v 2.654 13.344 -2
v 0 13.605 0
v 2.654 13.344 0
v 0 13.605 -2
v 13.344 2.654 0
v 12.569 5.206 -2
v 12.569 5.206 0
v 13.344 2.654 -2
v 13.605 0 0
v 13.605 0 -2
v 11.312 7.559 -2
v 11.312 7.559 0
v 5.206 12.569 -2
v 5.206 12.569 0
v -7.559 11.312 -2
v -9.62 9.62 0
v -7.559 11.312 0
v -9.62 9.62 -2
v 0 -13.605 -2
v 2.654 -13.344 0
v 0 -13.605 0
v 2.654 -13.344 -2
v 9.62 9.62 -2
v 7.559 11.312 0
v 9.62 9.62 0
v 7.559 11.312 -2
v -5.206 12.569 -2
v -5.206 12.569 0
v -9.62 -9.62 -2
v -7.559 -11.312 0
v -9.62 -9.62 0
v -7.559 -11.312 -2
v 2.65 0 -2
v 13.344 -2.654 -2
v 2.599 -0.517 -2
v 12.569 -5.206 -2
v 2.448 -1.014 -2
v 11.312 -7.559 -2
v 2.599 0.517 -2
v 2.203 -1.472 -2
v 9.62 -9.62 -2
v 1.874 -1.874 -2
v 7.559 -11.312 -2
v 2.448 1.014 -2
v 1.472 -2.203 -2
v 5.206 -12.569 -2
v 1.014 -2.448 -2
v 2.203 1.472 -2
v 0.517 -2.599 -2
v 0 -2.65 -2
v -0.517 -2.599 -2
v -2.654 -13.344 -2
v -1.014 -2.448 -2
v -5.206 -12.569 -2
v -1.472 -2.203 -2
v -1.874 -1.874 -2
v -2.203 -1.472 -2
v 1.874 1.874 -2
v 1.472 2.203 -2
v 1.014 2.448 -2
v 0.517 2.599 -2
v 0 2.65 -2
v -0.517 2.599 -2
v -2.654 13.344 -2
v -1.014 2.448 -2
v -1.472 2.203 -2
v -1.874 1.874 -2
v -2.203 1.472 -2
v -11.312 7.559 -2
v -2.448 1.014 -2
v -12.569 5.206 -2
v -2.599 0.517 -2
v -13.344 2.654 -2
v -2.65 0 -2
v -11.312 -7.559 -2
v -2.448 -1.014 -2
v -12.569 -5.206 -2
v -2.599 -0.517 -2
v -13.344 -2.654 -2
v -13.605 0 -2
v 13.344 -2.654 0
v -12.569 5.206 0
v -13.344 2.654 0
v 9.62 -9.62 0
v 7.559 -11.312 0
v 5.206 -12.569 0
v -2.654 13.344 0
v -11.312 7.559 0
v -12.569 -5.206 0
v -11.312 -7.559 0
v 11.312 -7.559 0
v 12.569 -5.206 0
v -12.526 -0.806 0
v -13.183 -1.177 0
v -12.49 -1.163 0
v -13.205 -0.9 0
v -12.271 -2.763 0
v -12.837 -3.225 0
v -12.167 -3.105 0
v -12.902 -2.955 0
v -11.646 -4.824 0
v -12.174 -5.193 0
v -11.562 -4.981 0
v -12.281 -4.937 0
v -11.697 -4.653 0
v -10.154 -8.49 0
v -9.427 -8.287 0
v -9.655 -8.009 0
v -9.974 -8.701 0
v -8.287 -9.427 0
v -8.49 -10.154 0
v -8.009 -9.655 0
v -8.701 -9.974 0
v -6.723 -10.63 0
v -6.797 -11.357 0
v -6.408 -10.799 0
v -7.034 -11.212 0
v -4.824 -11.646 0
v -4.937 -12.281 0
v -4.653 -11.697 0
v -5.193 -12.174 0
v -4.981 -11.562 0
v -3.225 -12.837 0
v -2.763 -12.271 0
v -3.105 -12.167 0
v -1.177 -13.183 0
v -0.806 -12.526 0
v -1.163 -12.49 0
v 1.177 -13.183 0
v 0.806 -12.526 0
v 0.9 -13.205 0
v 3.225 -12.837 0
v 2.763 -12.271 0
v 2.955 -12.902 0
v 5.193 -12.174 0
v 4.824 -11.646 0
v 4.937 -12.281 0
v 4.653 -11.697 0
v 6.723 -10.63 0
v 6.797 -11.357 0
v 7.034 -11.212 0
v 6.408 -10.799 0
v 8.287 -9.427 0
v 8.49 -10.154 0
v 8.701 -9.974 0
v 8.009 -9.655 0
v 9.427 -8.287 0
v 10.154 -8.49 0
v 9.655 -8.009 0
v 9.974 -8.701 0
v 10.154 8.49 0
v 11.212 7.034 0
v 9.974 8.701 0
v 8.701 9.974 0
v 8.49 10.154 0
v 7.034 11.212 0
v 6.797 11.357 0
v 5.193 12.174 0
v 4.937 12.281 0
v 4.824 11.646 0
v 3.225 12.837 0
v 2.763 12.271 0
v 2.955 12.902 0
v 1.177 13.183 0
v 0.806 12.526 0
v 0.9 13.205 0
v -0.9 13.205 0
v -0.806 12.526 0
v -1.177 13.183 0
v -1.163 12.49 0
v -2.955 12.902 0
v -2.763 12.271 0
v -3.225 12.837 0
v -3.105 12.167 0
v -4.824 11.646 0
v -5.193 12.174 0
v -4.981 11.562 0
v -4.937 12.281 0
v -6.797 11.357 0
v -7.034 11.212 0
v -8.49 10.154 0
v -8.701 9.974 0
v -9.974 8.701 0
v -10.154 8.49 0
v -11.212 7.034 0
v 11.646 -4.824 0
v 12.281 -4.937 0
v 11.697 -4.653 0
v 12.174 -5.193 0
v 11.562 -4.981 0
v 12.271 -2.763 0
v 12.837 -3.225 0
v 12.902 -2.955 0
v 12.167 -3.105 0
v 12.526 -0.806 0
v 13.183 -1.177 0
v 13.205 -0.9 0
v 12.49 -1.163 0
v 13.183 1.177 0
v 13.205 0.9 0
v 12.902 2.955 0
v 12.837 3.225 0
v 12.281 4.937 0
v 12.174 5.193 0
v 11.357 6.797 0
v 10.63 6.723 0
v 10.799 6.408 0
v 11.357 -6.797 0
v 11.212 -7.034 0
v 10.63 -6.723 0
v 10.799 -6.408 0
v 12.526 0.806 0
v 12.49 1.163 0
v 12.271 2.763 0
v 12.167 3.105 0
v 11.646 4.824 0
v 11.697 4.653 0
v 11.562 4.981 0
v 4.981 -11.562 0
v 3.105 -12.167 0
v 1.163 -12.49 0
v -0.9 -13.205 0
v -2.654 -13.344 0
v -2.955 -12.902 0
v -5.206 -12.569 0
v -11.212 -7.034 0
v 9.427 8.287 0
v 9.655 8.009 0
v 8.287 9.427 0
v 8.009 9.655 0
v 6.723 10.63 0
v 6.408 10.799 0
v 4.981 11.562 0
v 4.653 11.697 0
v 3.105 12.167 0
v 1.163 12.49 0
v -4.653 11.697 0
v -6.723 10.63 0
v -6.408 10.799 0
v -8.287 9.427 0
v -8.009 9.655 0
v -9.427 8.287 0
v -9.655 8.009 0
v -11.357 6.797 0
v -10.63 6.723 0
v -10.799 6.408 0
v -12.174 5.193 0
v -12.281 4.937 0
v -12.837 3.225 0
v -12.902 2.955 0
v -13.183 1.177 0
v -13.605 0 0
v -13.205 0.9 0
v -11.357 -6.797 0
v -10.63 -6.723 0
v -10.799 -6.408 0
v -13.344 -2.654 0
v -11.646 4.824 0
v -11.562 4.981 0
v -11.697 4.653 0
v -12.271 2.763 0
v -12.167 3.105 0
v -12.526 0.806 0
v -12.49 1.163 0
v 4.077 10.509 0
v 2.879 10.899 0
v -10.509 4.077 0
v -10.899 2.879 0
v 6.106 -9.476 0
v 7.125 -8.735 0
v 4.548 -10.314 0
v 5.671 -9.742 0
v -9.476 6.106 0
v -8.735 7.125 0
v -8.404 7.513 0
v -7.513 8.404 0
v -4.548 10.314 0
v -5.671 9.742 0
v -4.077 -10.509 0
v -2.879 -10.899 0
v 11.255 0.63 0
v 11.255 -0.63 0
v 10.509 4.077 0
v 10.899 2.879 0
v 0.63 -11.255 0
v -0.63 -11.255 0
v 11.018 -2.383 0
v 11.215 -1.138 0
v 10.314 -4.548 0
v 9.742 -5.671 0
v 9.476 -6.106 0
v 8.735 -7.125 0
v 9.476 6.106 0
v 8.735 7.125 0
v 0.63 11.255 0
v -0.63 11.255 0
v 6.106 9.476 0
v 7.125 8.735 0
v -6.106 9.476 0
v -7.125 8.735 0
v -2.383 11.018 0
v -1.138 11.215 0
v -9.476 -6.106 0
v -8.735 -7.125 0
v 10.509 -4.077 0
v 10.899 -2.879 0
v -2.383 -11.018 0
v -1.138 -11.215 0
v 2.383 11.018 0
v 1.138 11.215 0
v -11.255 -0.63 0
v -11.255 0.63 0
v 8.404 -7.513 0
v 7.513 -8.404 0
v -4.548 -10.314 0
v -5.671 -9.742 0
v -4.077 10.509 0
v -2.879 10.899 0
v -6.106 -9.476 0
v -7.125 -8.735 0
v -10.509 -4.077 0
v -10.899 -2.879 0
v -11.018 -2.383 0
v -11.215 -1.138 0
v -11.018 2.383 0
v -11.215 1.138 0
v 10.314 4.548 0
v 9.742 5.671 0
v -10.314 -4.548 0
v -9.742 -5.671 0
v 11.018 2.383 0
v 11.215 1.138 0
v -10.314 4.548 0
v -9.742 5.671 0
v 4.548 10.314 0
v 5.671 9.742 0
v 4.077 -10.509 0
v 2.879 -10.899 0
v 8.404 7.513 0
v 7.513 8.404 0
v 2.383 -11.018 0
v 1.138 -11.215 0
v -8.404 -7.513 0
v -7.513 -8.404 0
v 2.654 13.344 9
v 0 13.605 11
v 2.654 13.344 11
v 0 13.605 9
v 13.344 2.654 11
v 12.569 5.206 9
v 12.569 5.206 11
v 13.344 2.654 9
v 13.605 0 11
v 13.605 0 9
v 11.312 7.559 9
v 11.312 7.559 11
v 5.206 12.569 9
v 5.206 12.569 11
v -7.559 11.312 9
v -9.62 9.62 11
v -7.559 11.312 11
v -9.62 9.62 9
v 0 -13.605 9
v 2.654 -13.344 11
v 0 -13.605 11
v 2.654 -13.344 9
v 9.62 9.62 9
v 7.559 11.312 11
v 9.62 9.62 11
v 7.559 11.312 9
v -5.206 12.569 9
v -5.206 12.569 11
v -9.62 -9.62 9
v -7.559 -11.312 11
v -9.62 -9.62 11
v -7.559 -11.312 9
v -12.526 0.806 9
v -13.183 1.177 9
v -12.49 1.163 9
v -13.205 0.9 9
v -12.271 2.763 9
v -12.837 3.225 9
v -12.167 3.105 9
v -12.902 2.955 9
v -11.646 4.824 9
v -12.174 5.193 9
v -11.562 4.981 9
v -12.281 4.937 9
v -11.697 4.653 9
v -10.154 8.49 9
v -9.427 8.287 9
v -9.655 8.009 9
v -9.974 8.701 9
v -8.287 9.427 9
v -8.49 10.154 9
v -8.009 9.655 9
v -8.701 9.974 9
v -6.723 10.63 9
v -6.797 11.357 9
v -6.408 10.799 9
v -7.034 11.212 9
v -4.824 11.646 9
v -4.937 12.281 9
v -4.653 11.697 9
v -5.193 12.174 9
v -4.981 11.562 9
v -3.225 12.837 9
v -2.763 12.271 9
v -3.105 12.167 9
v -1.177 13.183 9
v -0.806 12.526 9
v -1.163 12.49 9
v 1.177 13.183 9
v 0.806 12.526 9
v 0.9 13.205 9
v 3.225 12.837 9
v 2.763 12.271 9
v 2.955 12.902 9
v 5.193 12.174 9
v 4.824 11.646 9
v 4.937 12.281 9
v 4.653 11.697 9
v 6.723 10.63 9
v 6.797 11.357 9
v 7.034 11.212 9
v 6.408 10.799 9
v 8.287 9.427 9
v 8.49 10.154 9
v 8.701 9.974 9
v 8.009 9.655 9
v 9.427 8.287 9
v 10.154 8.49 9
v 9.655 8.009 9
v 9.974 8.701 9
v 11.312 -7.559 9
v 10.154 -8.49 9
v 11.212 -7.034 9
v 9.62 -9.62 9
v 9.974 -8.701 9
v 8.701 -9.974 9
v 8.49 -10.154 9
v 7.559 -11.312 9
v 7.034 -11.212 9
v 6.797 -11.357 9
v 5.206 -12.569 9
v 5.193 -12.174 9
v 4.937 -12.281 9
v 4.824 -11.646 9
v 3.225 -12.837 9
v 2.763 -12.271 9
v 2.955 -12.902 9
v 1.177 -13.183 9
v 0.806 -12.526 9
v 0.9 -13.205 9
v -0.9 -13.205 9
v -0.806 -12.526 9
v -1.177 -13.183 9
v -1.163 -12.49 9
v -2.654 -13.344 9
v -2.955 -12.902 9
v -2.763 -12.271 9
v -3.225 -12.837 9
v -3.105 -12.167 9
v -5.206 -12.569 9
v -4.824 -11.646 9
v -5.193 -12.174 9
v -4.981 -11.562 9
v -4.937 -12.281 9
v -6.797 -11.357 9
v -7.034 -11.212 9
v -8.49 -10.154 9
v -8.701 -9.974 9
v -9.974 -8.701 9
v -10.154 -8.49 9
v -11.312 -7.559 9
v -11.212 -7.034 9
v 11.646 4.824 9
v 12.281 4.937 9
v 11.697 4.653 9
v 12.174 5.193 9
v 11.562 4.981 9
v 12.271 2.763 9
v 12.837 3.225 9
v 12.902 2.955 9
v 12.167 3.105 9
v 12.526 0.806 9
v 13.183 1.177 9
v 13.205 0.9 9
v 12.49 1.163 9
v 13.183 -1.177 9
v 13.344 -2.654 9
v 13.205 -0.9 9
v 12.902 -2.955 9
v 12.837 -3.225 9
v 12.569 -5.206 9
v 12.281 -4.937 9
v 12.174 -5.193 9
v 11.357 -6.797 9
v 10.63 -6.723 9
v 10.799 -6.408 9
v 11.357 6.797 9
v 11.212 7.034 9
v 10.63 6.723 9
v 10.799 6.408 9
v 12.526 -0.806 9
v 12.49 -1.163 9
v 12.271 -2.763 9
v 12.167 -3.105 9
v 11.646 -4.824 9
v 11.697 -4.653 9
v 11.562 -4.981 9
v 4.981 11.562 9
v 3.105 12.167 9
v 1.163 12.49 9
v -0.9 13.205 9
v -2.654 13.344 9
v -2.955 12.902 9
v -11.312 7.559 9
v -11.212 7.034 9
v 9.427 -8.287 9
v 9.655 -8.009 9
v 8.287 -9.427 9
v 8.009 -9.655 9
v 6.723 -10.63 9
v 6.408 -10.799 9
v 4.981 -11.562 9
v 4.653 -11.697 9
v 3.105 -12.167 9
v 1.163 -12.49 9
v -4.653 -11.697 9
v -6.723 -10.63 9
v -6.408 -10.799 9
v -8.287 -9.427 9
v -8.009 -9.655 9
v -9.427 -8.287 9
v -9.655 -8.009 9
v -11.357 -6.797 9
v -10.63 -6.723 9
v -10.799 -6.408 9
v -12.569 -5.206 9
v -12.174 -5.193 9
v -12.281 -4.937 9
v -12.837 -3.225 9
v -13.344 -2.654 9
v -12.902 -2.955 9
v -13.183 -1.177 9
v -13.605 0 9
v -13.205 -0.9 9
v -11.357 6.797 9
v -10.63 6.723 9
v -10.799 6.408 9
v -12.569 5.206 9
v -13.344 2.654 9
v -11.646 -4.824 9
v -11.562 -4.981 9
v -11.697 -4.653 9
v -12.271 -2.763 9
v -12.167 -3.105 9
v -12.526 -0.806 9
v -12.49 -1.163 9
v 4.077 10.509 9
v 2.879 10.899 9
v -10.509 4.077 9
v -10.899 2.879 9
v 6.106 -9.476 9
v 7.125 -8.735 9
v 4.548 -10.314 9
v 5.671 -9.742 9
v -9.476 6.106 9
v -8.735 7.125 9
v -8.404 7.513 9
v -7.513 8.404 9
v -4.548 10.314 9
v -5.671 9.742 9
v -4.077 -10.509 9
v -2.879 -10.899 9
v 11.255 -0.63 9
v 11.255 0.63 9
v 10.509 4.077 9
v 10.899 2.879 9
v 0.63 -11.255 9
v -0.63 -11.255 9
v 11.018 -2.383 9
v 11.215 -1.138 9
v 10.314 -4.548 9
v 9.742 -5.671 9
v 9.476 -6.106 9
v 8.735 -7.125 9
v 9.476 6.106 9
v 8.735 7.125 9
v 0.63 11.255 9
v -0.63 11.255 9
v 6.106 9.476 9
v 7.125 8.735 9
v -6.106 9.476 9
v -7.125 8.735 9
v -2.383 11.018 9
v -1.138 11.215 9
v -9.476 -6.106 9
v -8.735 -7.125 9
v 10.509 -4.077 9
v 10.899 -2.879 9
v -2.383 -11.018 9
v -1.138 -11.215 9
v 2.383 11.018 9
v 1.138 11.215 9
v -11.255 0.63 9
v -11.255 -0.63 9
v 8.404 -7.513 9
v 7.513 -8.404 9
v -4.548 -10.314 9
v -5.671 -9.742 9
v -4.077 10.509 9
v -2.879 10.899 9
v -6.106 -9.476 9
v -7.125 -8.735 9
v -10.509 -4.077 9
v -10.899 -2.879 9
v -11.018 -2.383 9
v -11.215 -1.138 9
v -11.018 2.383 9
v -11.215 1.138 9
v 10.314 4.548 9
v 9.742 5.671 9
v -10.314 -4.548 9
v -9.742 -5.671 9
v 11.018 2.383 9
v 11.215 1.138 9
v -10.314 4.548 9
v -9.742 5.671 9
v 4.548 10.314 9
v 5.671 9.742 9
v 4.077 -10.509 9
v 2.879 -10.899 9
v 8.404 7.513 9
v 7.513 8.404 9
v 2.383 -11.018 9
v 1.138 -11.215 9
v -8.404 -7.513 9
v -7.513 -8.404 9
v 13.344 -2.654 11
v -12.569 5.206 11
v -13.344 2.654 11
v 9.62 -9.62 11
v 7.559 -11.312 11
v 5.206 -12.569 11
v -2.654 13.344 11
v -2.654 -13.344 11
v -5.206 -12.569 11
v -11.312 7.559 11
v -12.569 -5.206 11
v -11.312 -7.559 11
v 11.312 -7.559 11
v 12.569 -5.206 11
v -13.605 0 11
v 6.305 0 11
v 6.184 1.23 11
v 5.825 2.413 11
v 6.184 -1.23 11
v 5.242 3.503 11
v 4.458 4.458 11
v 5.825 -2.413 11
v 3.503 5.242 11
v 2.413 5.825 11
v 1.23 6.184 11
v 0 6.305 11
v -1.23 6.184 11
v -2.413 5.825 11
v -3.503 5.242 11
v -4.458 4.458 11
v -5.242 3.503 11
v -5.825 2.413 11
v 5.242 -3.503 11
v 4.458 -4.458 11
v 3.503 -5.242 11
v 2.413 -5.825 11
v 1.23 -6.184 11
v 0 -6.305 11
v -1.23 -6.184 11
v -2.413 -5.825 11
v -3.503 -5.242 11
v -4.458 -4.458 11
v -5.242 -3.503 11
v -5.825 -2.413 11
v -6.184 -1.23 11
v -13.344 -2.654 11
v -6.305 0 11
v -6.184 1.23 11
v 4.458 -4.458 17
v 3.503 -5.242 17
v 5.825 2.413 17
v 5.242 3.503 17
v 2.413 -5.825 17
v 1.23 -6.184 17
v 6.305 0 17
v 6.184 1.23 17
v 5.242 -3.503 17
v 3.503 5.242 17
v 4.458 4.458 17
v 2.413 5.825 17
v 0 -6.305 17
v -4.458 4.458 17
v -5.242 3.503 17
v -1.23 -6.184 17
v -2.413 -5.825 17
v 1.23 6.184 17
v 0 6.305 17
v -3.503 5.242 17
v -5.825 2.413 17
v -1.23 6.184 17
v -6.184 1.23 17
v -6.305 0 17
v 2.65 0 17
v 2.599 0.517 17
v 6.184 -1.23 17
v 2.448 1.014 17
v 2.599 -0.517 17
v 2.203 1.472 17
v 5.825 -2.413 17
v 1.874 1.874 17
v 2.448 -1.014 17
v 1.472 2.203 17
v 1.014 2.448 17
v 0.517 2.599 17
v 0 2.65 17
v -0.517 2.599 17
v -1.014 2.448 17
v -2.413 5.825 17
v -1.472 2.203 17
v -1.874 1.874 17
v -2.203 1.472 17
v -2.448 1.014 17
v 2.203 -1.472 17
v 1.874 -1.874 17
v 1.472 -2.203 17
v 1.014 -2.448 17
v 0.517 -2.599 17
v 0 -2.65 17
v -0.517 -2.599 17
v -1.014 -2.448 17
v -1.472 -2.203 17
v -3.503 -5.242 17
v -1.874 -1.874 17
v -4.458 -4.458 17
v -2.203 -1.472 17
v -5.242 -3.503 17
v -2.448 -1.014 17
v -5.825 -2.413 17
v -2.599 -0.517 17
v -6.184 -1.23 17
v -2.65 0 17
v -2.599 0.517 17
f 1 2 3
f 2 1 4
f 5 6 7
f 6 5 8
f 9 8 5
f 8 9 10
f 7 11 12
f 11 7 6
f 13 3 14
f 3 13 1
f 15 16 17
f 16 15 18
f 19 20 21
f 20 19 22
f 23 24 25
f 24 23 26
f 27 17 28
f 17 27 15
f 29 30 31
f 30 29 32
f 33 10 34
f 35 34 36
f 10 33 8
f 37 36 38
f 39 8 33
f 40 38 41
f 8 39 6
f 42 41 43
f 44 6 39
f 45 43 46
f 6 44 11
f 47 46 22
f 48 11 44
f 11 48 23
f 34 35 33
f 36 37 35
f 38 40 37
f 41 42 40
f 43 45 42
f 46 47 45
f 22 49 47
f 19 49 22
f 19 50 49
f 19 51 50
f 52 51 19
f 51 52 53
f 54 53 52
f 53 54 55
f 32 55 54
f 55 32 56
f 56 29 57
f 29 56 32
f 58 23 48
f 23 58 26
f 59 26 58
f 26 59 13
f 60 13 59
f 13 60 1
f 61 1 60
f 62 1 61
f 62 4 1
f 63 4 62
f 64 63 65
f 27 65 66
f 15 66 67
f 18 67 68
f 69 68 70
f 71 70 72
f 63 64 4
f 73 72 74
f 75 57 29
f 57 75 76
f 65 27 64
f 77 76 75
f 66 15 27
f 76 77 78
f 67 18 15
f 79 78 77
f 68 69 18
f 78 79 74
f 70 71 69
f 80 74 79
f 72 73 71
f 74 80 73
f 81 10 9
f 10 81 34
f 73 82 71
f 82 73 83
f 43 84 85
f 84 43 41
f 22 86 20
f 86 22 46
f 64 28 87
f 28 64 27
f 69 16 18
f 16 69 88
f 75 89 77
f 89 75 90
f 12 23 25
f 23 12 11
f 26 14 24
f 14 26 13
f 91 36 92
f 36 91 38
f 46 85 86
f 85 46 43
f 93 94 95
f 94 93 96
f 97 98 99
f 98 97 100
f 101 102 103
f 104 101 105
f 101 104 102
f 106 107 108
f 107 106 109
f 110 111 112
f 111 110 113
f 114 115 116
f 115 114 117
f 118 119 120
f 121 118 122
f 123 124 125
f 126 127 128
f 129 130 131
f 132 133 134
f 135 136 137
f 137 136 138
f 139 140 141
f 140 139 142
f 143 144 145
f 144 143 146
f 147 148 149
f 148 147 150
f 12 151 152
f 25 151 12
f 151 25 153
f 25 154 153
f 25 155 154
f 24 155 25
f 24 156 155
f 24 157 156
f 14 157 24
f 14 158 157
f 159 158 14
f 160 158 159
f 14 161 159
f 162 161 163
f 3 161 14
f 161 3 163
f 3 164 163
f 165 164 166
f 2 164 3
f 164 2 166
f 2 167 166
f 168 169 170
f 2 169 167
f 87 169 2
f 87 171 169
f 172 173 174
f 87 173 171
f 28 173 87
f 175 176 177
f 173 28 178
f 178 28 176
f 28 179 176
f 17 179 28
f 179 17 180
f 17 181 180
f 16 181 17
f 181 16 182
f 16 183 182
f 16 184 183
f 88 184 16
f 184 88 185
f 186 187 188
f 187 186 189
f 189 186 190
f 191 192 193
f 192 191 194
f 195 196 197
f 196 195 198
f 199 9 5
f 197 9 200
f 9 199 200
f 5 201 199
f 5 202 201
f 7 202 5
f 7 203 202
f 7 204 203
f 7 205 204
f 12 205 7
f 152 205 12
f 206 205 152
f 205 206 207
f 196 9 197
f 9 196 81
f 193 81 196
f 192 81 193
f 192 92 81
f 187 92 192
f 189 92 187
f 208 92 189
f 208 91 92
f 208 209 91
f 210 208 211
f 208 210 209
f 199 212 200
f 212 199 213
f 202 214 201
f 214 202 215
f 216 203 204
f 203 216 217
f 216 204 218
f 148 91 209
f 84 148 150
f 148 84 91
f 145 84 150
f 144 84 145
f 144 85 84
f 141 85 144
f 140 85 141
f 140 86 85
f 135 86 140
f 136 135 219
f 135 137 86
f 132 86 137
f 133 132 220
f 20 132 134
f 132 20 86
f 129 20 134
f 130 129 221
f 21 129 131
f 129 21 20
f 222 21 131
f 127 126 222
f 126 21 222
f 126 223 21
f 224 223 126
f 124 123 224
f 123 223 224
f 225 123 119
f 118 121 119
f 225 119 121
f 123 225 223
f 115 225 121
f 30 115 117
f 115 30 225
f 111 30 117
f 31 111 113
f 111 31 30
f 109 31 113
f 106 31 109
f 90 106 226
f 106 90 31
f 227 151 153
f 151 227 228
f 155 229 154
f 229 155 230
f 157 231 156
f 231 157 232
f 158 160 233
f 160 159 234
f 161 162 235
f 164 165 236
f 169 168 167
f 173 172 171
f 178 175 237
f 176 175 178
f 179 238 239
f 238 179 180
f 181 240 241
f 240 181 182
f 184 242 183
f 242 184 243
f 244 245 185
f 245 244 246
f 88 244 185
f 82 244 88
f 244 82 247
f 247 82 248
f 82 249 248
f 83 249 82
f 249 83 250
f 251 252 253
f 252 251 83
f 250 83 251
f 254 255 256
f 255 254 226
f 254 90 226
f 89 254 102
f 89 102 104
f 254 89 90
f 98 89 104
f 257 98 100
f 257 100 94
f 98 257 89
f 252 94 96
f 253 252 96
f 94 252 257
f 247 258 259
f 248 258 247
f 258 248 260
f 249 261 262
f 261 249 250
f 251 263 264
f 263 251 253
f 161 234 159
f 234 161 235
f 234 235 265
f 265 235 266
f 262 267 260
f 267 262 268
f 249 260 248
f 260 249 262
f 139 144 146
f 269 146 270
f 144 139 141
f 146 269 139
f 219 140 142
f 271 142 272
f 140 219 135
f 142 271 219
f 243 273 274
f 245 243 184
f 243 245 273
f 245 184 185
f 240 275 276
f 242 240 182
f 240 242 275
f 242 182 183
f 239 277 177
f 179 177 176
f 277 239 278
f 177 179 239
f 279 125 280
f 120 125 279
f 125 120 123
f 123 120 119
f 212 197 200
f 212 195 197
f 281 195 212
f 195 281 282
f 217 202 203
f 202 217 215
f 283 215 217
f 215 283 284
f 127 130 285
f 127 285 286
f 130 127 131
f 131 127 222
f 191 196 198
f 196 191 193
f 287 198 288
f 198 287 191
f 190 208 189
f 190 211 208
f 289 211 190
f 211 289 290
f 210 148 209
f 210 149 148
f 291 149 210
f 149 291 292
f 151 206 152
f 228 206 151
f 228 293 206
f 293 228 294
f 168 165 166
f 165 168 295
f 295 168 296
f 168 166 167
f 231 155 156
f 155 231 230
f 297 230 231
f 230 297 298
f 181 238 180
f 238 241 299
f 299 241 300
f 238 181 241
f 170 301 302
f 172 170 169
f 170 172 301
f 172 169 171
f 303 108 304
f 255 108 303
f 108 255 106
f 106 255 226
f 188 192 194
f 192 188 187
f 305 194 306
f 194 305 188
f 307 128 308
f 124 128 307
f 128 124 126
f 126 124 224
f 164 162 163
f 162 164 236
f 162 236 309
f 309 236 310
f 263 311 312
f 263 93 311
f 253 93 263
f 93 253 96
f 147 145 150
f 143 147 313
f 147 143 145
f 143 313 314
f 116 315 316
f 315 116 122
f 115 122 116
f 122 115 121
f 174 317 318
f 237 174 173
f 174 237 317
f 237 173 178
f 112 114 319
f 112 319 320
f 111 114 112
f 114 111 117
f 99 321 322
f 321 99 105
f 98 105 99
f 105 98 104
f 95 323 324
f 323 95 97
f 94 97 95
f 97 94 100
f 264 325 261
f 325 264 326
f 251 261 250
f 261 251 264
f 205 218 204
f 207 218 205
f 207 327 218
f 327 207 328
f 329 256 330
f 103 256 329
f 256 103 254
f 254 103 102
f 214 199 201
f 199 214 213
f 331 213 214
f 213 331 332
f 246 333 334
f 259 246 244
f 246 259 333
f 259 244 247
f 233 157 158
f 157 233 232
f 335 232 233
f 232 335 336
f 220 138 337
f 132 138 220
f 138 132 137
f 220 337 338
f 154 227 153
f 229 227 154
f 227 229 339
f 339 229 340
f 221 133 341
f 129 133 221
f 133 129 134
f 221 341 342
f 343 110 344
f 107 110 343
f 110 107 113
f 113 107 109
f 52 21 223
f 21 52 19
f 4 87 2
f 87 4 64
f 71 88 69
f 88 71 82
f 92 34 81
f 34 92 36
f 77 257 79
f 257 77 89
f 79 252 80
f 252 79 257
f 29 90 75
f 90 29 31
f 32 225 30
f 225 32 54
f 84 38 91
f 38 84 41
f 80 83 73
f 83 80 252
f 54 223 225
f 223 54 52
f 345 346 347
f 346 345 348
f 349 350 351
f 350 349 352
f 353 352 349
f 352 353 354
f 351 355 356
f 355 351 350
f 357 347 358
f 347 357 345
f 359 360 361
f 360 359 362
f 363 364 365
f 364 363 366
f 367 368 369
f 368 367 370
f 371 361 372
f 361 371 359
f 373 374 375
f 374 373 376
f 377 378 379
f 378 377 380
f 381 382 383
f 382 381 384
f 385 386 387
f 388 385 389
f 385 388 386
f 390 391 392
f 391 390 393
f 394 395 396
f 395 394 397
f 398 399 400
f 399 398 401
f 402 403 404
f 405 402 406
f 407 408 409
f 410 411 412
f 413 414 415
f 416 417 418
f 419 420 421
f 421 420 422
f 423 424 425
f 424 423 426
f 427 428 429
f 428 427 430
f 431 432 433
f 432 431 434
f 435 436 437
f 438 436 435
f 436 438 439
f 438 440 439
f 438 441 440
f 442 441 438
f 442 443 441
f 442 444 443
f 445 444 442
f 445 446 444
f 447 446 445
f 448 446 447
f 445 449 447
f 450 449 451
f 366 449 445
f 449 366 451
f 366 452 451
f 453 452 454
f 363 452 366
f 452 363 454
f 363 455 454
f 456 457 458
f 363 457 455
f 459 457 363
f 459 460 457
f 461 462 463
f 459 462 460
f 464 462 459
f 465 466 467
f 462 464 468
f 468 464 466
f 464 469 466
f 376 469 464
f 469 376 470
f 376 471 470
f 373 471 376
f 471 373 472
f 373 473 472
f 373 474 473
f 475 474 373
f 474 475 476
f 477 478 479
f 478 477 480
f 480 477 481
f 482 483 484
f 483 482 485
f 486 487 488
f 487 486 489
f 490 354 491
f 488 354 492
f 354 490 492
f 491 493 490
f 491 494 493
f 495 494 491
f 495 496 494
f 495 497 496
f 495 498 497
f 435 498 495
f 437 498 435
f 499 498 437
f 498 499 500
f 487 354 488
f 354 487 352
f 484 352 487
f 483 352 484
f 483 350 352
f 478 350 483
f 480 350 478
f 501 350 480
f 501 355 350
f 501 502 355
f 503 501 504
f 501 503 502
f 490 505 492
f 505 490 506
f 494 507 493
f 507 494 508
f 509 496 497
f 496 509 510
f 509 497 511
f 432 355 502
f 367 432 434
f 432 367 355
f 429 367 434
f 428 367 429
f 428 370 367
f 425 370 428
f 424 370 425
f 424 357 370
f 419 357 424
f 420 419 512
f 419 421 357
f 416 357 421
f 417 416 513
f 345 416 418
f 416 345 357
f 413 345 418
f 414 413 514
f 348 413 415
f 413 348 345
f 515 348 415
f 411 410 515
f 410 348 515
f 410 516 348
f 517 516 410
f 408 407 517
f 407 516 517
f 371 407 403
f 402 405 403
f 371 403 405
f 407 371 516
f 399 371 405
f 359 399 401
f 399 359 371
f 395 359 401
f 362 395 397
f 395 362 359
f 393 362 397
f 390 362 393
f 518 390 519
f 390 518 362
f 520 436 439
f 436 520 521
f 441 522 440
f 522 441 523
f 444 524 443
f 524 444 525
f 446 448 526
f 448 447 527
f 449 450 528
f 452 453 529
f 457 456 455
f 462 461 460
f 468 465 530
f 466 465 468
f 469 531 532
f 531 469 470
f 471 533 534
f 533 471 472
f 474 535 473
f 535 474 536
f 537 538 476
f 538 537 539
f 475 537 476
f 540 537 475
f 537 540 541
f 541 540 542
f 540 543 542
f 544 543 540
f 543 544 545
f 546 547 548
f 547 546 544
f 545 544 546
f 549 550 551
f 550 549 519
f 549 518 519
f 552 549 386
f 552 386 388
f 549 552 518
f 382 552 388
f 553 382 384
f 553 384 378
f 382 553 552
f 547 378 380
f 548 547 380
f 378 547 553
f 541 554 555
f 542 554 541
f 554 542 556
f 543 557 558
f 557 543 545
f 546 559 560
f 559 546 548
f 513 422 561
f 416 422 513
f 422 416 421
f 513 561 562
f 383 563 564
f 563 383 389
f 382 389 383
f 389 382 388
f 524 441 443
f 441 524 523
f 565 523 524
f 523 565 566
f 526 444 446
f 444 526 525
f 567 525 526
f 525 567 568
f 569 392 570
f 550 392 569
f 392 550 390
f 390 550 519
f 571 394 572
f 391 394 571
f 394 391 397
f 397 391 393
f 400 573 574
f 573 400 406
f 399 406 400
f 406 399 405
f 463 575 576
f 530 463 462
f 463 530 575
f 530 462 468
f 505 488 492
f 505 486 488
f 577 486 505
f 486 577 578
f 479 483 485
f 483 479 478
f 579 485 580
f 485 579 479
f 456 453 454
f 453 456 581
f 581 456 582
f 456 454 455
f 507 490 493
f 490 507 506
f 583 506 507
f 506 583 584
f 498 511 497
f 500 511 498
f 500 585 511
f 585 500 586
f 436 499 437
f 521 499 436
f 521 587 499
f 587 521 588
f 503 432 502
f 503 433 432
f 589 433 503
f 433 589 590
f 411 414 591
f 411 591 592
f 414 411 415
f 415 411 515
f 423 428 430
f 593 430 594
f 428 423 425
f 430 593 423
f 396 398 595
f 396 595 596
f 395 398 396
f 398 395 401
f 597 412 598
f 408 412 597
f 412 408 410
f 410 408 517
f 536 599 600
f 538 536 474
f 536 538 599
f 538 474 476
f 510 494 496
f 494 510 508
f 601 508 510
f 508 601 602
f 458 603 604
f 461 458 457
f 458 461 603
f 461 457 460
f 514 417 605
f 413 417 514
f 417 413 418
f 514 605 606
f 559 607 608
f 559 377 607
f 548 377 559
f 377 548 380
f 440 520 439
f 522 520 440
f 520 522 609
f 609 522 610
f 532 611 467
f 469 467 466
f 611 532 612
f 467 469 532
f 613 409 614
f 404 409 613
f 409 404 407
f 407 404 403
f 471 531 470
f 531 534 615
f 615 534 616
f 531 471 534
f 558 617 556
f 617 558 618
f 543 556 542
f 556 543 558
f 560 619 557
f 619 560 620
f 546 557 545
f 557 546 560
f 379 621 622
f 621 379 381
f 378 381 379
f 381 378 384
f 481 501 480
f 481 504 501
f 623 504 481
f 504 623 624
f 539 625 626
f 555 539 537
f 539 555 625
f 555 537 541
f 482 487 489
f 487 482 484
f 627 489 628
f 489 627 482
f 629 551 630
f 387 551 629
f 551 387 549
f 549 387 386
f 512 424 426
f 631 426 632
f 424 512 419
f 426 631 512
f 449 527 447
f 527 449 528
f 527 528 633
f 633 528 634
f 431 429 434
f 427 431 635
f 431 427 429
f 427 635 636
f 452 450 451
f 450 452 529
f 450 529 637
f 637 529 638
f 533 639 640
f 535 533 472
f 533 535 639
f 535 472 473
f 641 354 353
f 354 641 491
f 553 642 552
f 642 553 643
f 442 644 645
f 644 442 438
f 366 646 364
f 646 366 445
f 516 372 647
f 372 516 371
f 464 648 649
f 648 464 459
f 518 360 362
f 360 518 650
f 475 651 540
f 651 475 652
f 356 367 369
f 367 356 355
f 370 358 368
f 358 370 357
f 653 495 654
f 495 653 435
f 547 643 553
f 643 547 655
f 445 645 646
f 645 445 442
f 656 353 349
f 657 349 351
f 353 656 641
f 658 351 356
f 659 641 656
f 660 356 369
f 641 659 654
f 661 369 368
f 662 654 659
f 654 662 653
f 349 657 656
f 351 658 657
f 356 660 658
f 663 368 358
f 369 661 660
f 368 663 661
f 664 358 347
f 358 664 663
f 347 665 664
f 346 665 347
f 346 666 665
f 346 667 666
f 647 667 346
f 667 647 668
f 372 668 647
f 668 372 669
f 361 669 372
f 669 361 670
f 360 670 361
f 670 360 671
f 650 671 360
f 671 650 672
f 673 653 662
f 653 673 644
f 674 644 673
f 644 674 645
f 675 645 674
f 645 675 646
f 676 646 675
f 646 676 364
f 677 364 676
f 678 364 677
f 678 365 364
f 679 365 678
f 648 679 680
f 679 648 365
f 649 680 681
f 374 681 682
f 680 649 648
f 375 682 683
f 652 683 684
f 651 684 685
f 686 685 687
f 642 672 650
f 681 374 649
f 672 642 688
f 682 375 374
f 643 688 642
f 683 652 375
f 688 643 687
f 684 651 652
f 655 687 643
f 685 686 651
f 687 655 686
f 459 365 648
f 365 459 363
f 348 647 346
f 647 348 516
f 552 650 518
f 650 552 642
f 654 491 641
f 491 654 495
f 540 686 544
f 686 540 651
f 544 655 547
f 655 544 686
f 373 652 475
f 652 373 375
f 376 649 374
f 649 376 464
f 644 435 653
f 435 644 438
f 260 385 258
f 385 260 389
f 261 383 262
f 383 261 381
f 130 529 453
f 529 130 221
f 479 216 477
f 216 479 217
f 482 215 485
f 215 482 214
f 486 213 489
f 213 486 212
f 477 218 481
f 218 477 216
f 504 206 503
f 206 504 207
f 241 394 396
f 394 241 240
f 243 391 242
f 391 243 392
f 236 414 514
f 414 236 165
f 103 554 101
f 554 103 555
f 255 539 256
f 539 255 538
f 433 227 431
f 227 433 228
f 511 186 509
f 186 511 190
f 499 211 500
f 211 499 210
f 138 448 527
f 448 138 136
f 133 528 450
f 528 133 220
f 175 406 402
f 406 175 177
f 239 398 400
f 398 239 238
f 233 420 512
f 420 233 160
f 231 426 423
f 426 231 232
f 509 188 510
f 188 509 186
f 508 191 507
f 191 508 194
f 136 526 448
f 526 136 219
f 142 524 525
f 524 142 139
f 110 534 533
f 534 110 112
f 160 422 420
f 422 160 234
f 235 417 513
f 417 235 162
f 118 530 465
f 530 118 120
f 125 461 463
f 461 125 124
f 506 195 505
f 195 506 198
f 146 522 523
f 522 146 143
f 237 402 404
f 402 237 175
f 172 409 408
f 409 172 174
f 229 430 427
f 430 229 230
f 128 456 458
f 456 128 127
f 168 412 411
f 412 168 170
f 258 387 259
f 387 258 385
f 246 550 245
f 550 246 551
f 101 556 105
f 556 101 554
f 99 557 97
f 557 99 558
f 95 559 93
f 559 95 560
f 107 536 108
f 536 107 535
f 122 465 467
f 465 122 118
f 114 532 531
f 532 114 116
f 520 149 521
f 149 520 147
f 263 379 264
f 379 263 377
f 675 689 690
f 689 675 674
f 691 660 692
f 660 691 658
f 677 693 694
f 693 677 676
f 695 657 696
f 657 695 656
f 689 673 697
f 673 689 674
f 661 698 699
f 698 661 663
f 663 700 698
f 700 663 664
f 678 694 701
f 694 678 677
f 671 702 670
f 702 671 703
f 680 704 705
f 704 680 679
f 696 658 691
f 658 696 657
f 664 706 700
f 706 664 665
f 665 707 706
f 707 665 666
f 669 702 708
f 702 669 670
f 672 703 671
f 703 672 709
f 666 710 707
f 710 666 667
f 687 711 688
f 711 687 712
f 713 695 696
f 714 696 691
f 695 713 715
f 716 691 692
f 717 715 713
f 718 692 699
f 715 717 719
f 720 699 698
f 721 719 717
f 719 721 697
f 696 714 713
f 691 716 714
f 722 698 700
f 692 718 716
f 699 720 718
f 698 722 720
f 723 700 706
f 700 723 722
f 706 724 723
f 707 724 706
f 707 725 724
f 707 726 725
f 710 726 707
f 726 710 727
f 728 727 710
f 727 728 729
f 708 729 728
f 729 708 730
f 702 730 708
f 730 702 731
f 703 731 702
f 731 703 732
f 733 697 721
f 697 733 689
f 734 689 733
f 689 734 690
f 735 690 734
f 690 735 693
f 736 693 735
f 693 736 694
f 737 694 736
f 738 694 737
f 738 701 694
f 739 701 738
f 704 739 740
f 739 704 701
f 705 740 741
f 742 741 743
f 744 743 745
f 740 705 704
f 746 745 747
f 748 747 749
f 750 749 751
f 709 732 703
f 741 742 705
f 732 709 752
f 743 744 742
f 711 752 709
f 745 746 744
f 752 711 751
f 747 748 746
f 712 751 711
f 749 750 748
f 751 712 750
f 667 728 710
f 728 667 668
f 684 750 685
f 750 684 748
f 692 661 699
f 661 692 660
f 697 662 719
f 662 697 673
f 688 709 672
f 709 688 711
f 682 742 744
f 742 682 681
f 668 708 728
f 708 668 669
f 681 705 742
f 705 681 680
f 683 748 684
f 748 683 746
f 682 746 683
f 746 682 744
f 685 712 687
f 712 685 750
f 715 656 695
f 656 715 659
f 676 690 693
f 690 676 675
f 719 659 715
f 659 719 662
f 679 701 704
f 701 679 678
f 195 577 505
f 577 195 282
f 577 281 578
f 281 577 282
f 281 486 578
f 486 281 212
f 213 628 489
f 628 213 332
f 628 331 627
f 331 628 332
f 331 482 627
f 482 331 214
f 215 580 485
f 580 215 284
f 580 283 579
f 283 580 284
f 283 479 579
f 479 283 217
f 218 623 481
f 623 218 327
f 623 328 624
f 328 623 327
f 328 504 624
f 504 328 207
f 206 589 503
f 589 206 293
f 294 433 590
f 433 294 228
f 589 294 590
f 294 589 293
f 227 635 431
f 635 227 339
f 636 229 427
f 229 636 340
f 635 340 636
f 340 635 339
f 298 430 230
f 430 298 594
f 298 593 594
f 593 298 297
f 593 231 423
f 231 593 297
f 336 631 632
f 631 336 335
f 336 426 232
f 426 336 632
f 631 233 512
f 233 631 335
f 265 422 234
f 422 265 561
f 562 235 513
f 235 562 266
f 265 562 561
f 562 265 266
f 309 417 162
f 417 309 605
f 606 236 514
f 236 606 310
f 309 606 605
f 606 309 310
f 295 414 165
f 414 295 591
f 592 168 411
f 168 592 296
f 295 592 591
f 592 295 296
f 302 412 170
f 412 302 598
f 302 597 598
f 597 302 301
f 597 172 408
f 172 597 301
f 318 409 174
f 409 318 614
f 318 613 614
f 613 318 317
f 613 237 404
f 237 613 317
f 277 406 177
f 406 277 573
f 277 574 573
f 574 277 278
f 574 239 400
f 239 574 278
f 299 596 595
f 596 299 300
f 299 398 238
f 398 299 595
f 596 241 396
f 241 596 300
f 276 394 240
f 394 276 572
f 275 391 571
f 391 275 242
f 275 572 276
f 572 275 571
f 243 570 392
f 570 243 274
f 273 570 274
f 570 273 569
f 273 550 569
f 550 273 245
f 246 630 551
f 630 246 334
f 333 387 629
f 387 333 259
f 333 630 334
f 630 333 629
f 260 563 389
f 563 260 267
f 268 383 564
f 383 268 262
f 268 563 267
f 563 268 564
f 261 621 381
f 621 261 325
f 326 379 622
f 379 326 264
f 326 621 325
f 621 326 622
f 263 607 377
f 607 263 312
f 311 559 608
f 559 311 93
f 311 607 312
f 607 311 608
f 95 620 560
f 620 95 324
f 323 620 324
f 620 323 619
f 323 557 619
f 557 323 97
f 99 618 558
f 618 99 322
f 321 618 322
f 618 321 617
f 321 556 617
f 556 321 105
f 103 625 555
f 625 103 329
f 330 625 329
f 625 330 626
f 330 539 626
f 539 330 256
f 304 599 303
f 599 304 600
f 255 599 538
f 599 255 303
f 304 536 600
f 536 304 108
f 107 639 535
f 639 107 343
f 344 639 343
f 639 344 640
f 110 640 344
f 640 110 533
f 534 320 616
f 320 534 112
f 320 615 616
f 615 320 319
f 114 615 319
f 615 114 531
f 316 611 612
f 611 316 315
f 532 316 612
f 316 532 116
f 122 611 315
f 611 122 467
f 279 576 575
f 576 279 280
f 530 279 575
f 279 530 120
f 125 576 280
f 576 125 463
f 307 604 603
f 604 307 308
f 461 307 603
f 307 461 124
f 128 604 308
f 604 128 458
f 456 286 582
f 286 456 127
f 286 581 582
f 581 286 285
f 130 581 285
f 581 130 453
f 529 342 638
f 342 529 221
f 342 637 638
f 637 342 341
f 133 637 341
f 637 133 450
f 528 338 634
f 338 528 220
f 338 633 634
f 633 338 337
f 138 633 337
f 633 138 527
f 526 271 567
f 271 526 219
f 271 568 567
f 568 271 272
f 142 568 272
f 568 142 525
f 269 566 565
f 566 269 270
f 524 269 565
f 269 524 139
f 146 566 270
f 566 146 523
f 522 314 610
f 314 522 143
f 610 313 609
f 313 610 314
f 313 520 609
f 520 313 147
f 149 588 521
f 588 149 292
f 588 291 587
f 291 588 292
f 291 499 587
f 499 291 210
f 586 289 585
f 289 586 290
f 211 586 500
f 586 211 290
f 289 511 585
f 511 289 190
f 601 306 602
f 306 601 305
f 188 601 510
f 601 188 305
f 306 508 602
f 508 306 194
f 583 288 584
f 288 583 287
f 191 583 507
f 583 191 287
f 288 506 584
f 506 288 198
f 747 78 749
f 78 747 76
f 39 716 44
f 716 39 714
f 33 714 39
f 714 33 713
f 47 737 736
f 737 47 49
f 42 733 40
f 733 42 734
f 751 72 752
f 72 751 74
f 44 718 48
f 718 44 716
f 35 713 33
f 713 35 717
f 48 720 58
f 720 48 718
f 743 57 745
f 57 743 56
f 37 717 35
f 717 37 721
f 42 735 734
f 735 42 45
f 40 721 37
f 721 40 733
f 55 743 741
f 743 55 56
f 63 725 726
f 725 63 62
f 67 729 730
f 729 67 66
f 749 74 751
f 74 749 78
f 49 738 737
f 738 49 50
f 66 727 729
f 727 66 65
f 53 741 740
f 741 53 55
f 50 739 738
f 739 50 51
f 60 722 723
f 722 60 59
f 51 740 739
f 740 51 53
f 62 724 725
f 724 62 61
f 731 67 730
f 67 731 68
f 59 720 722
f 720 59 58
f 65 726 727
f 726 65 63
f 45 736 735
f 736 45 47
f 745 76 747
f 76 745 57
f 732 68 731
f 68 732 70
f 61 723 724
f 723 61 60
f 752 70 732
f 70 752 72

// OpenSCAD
$fn = 32;

// ----------------------------------------------------------------------
// Timing pulley: GT2 40T, pitch 2 mm, 27.21 mm x 19 mm
// ----------------------------------------------------------------------

// --- parameters (mm) ---
pitch_mm = 2;             // belt pitch
tooth_count = 40;         // number of grooves
width = 9;                // belt width between the flanges
tip_d = 25.21;            // tip circle diameter
root_d = 23.71;           // groove bottom diameter
groove_h = 0.75;          // groove depth
tooth_w = 1.5;            // groove width at the tip circle
side_d = 27.21;           // flange diameter
side_t = 2;               // flange thickness
spigot_d = 22.11;         // flange spigot, sunk into the rim
spigot_h = 1.2;           // spigot depth into the rim
hub_bore = 5.3;           // shaft bore
hub_d = 12.61;            // hub diameter
hub_h = 6;                // hub above the flange
bottom_z = -2;            // lowest point of the pulley
top_z = 17;               // highest point of the pulley

module rim() {
  cylinder(h = width, d = tip_d);
}

module groove_cutter() {
  /* belt tooth groove: deeper than wide, cut through the belt width */
  translate([root_d / 2, 0, 0])
    linear_extrude(height = width)
      polygon(points = [[-0.6, -tooth_w * 0.42], [groove_h + 0.6, -tooth_w * 0.6],
                        [groove_h + 0.6, tooth_w * 0.6], [-0.6, tooth_w * 0.42]]);
}

module flanges() {
  translate([0, 0, -side_t]) cylinder(h = side_t, d = side_d);
  translate([0, 0, width]) cylinder(h = side_t, d = side_d);
  translate([0, 0, -spigot_h]) cylinder(h = spigot_h + 0.6, d = spigot_d);
  translate([0, 0, width - 0.6]) cylinder(h = spigot_h + 0.6, d = spigot_d);
}

module hub() {
  translate([0, 0, bottom_z]) cylinder(h = top_z - bottom_z, d = hub_d);
}

difference() {
  union() {
    rim();
    hub();
    flanges();
  }
  for (i = [0 : tooth_count - 1]) rotate([0, 0, i * 360 / tooth_count]) groove_cutter();
  translate([0, 0, bottom_z - 1]) cylinder(h = top_z - bottom_z + 2, d = hub_bore);
}
